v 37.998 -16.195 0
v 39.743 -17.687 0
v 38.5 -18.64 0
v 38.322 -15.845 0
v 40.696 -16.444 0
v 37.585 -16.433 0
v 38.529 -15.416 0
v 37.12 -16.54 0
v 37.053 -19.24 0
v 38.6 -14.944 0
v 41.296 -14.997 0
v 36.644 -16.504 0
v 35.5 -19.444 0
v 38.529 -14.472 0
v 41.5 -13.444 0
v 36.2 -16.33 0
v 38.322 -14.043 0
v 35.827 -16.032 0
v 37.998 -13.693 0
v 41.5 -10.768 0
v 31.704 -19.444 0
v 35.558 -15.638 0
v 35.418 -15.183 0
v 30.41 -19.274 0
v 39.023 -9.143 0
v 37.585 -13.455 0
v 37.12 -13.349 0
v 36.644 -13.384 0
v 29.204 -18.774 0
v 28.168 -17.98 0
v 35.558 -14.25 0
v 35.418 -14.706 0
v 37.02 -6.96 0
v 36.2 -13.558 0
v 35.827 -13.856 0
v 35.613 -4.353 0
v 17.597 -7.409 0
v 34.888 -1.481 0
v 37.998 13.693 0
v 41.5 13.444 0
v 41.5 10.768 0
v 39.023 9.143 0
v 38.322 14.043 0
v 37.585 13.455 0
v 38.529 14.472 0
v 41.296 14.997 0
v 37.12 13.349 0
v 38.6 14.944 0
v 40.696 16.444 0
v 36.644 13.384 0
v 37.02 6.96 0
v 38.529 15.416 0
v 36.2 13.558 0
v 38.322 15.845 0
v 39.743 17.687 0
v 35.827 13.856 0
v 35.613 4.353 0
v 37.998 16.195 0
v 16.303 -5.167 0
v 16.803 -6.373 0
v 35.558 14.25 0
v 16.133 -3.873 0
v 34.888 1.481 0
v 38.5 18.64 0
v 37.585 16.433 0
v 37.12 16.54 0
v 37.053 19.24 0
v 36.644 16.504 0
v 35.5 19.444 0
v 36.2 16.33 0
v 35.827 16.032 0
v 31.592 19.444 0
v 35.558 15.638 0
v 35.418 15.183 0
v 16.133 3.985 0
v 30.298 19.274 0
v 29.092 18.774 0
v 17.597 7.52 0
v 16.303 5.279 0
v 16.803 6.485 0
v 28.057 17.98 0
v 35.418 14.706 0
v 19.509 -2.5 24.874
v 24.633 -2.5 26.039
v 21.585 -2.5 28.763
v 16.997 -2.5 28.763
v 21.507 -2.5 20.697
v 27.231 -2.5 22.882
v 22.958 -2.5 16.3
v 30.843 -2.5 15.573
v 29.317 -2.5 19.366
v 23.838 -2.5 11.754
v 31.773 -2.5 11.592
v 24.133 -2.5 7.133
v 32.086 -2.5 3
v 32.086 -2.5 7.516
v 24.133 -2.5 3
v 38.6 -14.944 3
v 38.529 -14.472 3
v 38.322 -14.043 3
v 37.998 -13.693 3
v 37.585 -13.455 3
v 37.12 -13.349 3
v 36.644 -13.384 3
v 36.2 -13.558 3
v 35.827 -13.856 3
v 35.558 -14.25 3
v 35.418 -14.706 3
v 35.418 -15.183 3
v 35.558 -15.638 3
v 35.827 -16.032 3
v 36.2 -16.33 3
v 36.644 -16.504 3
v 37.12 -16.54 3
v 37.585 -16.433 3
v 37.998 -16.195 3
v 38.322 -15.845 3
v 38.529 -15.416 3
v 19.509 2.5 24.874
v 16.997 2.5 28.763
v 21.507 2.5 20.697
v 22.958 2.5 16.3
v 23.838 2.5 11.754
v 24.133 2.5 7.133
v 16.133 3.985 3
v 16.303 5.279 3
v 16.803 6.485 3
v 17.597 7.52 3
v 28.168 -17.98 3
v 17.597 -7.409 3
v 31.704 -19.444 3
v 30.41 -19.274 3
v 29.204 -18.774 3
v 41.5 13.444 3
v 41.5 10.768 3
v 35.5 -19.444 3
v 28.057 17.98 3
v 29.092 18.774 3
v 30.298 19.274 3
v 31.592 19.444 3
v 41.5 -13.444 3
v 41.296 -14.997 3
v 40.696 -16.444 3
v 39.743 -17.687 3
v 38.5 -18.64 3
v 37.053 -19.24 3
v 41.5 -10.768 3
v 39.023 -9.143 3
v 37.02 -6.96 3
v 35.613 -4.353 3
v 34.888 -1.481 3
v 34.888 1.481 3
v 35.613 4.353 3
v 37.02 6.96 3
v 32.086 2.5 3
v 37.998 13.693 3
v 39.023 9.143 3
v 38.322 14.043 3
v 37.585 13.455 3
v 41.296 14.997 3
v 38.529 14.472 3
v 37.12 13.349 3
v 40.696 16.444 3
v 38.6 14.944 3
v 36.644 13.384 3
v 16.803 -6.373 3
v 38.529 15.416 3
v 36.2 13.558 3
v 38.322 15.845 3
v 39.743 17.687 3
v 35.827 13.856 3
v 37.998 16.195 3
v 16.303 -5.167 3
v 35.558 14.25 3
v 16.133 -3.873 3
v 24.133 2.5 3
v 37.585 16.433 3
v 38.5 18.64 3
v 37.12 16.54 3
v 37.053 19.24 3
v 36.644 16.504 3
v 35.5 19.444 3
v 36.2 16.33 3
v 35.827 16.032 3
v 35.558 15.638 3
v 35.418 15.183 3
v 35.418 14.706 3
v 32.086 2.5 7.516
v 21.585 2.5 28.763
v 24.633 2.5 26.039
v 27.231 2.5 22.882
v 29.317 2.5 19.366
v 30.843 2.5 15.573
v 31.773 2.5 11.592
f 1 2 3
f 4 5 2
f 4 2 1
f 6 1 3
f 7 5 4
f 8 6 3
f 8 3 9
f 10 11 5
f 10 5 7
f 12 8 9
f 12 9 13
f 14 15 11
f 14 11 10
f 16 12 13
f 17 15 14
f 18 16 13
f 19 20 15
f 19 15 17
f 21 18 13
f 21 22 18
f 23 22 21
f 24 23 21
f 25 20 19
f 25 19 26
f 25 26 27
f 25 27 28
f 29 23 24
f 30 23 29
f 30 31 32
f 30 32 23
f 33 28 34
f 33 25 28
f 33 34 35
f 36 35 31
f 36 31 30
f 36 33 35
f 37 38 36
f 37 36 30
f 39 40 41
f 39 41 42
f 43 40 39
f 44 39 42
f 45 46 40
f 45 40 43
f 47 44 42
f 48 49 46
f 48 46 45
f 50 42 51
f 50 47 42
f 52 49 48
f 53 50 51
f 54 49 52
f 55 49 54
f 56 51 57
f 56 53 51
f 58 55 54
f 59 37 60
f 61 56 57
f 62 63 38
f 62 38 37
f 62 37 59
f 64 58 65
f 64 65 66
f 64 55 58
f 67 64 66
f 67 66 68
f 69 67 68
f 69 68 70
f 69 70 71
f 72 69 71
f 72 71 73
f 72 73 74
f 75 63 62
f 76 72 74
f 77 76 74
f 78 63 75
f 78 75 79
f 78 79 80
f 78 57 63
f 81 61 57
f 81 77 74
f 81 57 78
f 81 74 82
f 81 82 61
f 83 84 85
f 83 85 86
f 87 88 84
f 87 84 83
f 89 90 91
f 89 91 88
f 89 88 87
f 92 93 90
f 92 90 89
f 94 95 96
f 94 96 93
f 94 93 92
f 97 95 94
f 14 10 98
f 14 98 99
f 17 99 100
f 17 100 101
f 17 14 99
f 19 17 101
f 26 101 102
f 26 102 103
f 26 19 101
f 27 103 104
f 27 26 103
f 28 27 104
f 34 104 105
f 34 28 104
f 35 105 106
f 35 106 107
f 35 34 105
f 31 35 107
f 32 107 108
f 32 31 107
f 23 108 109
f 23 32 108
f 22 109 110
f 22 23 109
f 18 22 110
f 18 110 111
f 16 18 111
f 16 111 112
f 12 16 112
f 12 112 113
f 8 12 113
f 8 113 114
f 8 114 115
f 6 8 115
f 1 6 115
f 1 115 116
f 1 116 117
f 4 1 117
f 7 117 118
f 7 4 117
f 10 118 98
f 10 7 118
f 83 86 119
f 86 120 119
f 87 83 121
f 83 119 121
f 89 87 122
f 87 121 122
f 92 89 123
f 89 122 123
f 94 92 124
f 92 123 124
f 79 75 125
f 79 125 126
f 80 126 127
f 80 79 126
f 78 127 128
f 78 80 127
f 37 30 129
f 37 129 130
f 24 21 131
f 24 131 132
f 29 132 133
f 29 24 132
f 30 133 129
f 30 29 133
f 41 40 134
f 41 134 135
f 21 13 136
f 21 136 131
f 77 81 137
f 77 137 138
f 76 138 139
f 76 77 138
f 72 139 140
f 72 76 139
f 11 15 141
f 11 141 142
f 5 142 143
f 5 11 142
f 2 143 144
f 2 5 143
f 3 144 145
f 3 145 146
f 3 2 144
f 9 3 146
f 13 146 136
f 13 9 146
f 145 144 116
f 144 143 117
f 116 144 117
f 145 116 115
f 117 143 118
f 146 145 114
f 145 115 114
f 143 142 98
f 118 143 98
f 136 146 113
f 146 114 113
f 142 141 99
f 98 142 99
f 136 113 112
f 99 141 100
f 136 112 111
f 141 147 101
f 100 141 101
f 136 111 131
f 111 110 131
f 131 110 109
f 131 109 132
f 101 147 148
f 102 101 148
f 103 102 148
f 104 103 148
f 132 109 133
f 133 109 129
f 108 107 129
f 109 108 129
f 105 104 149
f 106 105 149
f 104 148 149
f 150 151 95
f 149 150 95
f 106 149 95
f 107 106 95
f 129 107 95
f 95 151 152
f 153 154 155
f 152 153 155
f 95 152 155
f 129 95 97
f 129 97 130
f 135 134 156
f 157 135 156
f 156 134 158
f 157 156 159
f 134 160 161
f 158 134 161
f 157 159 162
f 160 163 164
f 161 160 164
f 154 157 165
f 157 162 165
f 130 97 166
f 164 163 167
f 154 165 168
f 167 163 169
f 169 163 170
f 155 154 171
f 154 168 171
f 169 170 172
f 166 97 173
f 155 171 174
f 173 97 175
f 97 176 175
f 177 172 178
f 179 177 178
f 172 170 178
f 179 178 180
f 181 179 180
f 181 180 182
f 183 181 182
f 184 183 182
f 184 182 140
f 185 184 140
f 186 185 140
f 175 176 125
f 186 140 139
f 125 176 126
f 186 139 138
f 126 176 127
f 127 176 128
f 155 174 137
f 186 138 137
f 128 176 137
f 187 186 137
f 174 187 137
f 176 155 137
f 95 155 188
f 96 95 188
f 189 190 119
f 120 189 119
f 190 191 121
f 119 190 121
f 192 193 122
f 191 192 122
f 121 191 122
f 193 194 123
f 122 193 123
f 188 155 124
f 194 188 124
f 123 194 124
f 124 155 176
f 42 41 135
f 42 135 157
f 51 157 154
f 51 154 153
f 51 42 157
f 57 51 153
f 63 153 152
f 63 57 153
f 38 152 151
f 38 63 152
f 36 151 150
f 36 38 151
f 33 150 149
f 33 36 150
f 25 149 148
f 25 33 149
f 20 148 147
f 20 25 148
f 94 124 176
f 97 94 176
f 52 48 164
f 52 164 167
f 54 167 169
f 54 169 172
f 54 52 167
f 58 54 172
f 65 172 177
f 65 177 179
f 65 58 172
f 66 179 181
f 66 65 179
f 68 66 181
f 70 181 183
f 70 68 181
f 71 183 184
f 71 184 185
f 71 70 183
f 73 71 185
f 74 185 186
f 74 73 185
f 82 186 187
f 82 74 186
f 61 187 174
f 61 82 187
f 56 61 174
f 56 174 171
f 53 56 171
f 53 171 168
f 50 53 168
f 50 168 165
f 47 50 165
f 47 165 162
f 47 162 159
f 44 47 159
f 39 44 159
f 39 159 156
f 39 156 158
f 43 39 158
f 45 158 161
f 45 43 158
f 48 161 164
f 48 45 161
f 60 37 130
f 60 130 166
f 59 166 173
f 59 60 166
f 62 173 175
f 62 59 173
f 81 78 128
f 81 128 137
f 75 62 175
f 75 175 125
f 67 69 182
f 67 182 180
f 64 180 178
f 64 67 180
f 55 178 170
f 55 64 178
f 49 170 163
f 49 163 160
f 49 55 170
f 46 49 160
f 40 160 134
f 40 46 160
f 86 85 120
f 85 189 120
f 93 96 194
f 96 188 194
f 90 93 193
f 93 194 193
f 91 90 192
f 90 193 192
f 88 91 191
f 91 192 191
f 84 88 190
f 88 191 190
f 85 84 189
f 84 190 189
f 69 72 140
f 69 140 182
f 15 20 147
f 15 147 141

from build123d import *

# Parameters (mm, degrees)
SKETCH1_R           = 1.6
BOSS_EXTRUDE1_DEPTH = 3
BOSS_EXTRUDE2_DEPTH = 2.5


with BuildPart() as part:
    # Sketch1 → Boss-Extrude1 (new body)
    with BuildSketch(Plane.XY):
        with BuildLine():
            Line((41.5, -10.768201729), (41.5, -13.444086969))
            ThreePointArc((41.5, -13.444086969), (39.742640687, -17.686727656), (35.5, -19.444086969))
            Line((35.5, -19.444086969), (31.703672228, -19.444086969))
            ThreePointArc((31.703672228, -19.444086969), (29.790255066, -19.063484632), (28.168138322, -17.979620875))
            Line((28.168138322, -17.979620875), (17.597242638, -7.408725191))
            ThreePointArc((17.597242638, -7.408725191), (16.513378881, -5.786608447), (16.132776544, -3.873191285))
            Line((16.132776544, -3.873191285), (16.132776544, 3.984673091))
            ThreePointArc((16.132776544, 3.984673091), (16.513378881, 5.898090253), (17.597242638, 7.520206997))
            Line((17.597242638, 7.520206997), (28.056656516, 17.979620875))
            ThreePointArc((28.056656516, 17.979620875), (29.67877326, 19.063484632), (31.592190422, 19.444086969))
            Line((31.592190422, 19.444086969), (35.5, 19.444086969))
            ThreePointArc((35.5, 19.444086969), (39.742640687, 17.686727656), (41.5, 13.444086969))
            Line((41.5, 13.444086969), (41.5, 10.768201729))
            ThreePointArc((41.5, 10.768201729), (34.795831523, 0), (41.5, -10.768201729))
        make_face()
        with Locations((37, 14.944086969)):
            Circle(SKETCH1_R, mode=Mode.SUBTRACT)
        with Locations((37, -14.944086969)):
            Circle(SKETCH1_R, mode=Mode.SUBTRACT)
    extrude(amount=BOSS_EXTRUDE1_DEPTH)

    # Sketch2 → Boss-Extrude2 (add, symmetric)
    with BuildSketch(Plane(origin=(0, 0, 0), x_dir=(1, 0, 0), z_dir=(0, 1, 0))):
        with BuildLine():
            Line((32.08575566, -3), (32.08575566, -7.515745333))
            ThreePointArc((32.08575566, -7.515745333), (29.317171973, -19.366233959), (21.584586927, -28.76337527))
            Line((21.584586927, -28.76337527), (16.996844286, -28.76337527))
            ThreePointArc((16.996844286, -28.76337527), (22.302728229, -18.521432225), (24.132776544, -7.132809616))
            Line((24.132776544, -7.132809616), (24.132776544, -3))
            Line((24.132776544, -3), (32.08575566, -3))
        make_face()
    extrude(amount=BOSS_EXTRUDE2_DEPTH, both=True)


solid = part.part
